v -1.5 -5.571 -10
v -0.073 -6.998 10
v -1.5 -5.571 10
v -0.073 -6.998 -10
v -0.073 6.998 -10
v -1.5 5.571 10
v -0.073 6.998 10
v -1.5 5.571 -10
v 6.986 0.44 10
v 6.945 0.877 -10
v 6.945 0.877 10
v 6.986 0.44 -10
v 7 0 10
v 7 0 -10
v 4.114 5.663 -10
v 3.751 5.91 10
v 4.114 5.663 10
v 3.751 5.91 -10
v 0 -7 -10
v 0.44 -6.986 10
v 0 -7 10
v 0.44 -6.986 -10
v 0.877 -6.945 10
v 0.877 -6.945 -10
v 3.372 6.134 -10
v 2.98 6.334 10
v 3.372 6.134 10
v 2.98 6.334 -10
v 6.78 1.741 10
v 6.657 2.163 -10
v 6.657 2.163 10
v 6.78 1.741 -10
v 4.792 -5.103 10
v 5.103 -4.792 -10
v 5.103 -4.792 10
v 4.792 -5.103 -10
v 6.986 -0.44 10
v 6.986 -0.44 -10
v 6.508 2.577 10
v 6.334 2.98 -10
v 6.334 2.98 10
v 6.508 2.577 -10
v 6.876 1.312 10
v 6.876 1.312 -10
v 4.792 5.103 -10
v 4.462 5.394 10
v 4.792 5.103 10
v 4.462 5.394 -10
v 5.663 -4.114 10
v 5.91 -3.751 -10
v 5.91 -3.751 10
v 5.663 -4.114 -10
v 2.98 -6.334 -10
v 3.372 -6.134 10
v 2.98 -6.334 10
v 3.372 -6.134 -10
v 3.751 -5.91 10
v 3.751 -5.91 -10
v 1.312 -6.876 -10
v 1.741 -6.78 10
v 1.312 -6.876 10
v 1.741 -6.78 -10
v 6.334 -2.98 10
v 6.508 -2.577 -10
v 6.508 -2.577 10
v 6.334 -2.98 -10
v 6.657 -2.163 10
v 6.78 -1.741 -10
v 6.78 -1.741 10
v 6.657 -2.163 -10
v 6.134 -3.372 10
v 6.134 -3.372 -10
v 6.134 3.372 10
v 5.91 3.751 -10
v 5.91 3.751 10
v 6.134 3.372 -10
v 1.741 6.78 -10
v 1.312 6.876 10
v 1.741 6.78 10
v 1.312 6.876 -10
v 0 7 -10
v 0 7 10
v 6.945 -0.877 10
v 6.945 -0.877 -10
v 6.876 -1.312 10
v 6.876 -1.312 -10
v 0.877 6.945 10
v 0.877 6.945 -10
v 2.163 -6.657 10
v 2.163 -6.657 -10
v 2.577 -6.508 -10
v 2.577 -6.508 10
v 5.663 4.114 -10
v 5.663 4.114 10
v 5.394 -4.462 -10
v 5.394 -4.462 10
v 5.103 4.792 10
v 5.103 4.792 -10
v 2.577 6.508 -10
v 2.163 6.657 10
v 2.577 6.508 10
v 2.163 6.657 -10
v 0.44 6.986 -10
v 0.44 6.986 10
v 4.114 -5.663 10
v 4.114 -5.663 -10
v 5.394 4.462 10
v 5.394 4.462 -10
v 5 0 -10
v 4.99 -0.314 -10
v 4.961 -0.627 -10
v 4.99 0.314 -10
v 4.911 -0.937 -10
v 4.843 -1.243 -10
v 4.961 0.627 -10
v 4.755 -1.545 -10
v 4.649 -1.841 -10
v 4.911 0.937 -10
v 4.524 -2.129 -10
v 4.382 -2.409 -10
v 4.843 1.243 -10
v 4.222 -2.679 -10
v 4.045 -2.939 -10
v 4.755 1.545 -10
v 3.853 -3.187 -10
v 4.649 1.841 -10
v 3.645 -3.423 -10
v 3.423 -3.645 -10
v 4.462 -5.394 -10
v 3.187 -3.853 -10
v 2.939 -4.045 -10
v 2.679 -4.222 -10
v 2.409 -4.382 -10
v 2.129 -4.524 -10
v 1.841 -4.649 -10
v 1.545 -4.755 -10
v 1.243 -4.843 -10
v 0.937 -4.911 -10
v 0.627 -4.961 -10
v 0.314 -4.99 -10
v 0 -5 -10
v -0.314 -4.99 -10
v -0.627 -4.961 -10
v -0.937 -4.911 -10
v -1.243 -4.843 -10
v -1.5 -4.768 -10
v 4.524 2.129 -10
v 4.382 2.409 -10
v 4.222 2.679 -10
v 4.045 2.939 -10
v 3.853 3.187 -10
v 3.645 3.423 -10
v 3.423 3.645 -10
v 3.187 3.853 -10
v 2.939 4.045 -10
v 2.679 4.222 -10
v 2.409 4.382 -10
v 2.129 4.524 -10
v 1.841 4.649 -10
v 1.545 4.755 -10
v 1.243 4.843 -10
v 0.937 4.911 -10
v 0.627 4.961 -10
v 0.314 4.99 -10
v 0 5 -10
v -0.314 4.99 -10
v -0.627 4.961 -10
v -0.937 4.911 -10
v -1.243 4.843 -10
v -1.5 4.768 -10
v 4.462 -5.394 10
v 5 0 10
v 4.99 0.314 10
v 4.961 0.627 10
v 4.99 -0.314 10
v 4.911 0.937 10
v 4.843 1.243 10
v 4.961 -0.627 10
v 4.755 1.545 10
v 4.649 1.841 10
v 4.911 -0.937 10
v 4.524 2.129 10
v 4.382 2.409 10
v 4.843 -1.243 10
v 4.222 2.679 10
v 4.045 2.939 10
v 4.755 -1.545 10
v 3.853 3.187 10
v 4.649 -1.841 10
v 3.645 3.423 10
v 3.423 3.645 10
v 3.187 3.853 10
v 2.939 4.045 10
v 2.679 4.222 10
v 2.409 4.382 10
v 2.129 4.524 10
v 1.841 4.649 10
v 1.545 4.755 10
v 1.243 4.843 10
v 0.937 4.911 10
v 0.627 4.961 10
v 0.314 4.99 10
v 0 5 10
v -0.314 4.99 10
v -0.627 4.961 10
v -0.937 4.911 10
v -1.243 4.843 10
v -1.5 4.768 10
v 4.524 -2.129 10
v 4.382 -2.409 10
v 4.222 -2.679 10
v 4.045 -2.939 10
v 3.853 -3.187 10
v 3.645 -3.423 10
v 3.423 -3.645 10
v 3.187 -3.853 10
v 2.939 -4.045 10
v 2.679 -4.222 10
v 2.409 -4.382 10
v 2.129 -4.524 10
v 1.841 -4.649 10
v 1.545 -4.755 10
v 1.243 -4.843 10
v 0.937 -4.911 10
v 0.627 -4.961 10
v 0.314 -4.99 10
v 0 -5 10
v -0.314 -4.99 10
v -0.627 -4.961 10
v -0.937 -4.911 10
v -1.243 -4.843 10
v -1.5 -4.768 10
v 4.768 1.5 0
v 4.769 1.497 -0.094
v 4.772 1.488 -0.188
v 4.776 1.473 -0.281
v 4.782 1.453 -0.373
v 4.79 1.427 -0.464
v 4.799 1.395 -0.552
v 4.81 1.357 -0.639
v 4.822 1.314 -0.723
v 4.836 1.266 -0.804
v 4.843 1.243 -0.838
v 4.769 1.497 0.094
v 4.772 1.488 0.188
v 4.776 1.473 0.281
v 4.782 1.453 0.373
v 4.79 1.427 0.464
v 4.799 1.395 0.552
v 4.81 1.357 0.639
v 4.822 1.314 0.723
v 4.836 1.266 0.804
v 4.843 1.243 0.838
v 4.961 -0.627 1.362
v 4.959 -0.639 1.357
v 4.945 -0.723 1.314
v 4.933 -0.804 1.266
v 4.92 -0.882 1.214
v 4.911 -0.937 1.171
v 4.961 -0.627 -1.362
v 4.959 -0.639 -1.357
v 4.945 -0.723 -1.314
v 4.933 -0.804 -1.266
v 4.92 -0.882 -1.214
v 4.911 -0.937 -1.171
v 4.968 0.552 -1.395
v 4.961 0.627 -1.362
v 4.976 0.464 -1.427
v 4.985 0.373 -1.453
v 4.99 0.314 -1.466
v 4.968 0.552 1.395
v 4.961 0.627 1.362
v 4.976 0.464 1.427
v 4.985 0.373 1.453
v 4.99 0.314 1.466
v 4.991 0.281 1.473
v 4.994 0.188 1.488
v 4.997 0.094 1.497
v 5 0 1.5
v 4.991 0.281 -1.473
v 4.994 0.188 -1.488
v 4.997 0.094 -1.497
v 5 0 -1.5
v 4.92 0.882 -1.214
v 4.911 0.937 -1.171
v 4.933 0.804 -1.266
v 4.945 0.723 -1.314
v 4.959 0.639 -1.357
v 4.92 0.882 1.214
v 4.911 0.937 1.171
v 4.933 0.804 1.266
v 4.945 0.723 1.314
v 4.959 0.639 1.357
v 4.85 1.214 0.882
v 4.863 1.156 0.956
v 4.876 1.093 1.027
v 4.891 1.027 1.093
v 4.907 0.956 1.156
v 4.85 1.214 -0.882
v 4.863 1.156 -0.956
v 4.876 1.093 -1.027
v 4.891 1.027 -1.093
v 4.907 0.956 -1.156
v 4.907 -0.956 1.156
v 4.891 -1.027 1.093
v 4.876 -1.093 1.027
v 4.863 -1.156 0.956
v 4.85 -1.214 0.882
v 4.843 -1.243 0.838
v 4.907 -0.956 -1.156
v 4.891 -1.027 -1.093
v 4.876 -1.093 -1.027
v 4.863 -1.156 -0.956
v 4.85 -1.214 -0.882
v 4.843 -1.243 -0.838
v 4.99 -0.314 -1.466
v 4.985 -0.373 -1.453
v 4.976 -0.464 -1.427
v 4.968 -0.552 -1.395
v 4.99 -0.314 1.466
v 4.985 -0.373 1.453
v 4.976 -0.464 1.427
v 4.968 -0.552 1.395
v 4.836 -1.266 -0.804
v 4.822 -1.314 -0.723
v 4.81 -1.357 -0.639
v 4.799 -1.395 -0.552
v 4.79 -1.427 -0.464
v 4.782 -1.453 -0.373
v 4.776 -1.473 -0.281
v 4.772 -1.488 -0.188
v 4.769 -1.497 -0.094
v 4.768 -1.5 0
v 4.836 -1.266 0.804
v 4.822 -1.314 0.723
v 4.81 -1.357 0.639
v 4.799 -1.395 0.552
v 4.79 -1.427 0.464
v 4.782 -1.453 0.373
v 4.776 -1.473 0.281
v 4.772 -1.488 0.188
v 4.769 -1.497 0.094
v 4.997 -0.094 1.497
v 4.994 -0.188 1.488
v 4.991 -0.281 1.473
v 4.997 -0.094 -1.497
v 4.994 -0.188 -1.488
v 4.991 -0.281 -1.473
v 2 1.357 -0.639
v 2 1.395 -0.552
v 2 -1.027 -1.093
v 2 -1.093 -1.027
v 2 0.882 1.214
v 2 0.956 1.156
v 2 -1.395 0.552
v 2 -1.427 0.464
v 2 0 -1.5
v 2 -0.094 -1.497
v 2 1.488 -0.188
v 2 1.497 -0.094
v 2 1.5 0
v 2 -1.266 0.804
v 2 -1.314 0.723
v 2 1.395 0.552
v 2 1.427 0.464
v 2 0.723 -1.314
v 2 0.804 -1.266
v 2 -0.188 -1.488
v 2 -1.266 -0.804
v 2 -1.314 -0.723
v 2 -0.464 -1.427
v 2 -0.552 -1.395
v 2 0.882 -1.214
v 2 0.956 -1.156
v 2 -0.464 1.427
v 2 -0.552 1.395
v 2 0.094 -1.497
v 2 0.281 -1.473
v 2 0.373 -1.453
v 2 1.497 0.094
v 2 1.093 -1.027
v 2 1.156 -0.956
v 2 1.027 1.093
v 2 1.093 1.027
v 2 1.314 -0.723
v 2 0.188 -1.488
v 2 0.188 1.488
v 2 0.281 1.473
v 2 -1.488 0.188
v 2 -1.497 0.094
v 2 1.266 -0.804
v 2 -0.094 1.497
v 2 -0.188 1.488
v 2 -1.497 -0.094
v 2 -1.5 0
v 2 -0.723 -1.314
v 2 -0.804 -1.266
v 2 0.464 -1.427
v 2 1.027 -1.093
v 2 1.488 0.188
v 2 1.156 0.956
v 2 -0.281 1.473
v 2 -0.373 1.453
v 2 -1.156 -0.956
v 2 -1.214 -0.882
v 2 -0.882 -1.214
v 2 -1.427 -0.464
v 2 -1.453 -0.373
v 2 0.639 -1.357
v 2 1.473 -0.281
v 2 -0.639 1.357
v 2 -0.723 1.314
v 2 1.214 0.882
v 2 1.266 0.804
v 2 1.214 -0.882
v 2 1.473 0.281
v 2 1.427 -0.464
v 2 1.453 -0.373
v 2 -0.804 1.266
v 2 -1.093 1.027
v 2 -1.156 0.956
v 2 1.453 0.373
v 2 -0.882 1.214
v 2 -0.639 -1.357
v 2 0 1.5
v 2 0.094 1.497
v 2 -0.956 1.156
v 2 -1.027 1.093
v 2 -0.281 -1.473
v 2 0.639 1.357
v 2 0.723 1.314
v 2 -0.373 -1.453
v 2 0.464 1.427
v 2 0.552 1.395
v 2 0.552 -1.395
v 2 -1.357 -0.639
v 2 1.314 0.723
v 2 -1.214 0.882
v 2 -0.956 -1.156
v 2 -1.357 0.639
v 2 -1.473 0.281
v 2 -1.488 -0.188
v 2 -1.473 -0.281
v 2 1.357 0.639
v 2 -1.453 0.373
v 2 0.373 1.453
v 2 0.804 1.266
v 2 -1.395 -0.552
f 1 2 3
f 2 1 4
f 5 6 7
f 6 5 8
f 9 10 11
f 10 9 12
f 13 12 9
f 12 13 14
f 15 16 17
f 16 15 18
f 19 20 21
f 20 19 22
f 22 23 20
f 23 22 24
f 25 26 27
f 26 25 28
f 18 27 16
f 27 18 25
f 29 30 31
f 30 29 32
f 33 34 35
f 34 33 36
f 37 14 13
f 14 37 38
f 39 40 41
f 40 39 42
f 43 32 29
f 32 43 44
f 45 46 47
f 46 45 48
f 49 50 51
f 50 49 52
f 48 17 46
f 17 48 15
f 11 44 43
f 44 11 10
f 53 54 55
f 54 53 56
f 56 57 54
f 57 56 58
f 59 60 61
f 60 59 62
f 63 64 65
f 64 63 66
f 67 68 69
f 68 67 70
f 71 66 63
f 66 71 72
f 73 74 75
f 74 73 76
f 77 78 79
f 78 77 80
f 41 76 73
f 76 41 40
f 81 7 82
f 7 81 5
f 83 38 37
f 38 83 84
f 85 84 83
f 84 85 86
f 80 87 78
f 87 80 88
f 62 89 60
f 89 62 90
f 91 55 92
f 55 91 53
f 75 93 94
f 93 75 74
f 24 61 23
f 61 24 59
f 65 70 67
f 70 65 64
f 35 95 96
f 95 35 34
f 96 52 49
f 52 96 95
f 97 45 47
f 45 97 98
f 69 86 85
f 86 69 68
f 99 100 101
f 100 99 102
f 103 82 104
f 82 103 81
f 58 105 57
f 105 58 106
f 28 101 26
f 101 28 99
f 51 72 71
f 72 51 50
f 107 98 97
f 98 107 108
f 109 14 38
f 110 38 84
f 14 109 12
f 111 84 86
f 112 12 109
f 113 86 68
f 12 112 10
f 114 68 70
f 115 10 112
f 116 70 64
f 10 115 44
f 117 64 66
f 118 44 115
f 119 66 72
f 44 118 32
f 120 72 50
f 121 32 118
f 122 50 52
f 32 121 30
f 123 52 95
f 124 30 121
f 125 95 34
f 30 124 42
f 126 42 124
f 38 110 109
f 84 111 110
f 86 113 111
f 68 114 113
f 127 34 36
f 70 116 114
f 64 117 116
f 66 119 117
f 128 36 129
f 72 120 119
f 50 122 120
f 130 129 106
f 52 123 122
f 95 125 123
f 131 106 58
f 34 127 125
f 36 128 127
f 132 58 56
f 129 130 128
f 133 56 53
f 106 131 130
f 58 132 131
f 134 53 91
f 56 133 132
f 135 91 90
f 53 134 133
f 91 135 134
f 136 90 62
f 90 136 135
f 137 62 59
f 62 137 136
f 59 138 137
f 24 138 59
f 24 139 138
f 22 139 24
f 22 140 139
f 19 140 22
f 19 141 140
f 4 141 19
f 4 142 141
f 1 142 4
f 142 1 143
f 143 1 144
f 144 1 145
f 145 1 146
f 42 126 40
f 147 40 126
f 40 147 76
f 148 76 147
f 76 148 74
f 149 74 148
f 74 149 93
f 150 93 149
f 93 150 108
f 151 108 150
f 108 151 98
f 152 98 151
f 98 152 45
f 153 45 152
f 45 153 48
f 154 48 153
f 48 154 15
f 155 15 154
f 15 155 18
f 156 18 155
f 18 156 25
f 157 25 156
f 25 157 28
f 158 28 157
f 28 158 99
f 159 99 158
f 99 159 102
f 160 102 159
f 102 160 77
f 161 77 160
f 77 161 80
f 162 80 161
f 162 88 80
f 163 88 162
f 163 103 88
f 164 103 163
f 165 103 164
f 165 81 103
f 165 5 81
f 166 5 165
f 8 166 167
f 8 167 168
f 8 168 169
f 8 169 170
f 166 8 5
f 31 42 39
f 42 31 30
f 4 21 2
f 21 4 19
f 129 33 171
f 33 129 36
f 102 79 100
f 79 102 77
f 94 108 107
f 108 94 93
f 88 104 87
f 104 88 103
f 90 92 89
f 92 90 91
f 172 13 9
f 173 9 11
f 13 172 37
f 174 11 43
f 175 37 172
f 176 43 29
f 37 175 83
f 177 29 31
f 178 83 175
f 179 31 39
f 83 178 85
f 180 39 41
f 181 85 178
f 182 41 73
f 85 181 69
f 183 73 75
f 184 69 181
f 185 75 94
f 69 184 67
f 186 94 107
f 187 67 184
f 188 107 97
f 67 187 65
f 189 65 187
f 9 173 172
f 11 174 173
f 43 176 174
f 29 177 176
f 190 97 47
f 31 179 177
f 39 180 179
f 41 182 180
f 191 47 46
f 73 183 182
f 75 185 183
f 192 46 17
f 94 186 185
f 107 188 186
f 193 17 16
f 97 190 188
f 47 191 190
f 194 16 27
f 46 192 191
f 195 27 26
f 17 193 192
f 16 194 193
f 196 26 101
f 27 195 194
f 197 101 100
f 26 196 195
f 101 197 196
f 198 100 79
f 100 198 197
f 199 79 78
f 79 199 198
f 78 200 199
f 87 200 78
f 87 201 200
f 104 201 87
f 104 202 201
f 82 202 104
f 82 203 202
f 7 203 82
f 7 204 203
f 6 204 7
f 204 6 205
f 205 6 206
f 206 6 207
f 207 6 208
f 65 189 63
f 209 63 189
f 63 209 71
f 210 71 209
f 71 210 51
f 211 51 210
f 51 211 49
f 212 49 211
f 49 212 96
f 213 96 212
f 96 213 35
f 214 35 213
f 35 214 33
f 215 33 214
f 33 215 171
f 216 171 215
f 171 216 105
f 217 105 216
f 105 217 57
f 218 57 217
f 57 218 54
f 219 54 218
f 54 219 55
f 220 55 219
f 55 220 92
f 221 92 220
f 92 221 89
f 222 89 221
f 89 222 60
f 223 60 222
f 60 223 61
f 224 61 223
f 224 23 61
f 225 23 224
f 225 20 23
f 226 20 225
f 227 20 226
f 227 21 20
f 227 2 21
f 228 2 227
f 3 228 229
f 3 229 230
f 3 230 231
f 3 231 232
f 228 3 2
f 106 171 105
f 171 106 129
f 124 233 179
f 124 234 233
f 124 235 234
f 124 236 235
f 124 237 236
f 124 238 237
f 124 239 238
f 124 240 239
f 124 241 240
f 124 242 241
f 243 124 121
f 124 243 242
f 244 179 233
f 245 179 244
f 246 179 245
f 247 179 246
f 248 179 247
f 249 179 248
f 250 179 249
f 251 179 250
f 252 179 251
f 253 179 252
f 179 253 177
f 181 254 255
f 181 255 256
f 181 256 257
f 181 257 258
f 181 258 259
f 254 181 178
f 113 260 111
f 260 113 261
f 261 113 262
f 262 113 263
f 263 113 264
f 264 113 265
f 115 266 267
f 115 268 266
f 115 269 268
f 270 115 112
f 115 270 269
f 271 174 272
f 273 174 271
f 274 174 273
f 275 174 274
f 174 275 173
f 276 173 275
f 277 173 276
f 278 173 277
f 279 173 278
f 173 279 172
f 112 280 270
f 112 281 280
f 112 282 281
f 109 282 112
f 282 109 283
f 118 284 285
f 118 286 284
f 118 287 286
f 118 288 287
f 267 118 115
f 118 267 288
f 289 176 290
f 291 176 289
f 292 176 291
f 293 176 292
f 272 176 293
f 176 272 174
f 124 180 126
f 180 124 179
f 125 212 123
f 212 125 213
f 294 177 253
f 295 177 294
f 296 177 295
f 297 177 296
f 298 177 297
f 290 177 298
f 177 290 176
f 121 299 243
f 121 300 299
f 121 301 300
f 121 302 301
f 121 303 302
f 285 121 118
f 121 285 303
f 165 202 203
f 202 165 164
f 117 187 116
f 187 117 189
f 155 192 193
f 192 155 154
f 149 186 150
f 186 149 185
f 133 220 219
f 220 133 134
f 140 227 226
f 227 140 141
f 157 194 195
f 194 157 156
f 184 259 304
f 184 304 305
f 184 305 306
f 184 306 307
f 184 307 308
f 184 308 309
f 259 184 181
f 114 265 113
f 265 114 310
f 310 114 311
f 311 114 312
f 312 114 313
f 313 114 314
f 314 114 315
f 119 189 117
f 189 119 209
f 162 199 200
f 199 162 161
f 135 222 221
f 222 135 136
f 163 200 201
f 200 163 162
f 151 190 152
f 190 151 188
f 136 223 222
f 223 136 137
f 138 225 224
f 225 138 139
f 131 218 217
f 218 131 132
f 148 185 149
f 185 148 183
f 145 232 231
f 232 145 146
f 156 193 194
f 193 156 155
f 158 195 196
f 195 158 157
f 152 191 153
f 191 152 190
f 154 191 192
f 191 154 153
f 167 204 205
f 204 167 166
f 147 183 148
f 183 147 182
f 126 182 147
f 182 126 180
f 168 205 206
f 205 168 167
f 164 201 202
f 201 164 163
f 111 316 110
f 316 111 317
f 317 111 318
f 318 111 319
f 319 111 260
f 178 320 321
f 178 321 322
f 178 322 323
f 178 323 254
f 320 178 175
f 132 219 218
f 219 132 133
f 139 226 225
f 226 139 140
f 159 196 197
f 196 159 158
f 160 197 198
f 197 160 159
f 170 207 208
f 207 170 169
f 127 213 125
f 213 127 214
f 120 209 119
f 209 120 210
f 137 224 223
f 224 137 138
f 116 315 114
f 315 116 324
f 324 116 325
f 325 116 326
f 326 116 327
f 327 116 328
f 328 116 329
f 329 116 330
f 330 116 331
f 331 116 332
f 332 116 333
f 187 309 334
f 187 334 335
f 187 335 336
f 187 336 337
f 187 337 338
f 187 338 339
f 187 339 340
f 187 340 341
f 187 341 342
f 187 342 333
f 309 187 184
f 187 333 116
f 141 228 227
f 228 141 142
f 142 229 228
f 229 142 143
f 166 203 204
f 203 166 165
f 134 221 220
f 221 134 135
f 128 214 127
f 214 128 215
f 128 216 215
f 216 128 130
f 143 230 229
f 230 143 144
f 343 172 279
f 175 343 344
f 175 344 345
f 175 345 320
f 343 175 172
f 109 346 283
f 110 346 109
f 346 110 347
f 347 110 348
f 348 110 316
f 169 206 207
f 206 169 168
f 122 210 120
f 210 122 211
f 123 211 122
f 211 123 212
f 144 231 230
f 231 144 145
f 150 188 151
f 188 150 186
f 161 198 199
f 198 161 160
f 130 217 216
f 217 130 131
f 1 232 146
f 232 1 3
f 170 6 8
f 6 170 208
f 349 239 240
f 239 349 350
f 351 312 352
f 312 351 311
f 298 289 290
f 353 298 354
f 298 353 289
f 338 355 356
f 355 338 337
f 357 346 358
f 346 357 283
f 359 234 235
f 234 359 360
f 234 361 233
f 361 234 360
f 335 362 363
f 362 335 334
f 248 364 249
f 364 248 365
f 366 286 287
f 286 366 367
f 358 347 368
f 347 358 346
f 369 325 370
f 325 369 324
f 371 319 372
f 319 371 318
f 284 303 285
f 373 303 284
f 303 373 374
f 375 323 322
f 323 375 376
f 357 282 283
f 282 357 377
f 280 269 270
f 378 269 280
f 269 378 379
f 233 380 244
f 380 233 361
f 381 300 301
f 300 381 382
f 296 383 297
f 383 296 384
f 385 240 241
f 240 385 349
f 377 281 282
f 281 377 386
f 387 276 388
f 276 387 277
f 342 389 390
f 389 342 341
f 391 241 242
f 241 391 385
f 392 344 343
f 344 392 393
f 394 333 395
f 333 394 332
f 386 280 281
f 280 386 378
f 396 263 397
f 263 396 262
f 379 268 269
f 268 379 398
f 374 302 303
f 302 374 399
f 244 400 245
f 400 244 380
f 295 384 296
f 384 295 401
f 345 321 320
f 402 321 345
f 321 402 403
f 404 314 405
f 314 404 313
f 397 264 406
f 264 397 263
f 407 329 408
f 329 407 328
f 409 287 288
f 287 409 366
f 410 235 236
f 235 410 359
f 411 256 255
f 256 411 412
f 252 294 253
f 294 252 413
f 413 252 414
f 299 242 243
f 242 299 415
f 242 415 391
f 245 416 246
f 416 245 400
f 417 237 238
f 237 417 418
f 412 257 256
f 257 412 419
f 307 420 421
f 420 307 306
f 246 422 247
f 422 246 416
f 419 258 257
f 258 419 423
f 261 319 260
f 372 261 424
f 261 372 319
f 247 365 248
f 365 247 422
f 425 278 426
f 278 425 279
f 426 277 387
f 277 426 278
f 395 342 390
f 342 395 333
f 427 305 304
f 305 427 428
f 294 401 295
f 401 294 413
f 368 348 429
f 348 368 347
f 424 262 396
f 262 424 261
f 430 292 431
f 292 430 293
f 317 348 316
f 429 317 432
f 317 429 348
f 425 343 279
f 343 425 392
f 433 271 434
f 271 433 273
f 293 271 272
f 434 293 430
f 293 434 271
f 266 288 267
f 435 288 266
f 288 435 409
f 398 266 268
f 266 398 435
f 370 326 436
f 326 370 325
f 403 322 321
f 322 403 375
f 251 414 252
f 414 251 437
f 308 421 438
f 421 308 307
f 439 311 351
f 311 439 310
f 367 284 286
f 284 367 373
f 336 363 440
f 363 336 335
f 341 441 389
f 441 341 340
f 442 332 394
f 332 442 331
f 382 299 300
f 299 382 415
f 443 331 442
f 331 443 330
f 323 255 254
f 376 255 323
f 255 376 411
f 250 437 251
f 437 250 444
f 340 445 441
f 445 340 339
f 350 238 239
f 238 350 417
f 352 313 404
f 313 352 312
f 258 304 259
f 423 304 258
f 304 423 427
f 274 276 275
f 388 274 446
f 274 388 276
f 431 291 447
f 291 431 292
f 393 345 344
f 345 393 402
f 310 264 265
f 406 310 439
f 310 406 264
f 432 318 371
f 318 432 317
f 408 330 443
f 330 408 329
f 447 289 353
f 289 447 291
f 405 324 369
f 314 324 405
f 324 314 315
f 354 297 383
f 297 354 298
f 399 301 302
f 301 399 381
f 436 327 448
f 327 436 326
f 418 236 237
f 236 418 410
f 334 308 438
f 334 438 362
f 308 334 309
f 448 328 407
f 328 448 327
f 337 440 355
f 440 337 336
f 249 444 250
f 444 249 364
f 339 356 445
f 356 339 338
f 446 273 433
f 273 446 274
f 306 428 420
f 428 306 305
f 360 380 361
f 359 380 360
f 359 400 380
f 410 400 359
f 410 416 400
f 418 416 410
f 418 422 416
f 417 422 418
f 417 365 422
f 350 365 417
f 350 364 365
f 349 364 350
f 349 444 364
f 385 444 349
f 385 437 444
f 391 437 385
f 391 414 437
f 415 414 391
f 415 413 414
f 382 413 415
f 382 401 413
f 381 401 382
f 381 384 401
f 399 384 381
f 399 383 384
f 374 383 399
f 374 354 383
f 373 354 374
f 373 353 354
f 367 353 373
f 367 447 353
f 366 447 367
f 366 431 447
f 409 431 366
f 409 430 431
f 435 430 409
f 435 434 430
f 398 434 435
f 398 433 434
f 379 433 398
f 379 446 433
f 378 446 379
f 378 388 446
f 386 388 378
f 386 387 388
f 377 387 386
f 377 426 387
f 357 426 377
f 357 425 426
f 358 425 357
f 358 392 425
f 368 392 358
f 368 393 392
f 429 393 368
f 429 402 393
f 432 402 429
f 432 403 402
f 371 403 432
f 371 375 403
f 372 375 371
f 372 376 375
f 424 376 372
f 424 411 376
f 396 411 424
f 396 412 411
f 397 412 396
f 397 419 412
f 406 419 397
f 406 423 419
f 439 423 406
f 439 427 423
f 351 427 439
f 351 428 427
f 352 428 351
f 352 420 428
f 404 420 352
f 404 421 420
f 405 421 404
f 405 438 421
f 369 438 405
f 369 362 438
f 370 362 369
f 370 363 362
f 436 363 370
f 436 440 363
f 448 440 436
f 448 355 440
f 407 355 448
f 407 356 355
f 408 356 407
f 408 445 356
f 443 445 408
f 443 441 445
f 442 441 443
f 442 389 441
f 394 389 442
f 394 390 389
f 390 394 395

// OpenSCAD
$fn=100;

diameterPipe = 10;
thickness = 2;
height = 20;
partitionDepth = 0.65*diameterPipe+thickness;

diameterBit = 3;
heightBit = 3;

module projektorClip() {
    difference() {
        cylinder(r=(diameterPipe/2)+thickness, h=height, center = true);
        cylinder(r=diameterPipe/2, h=height, center=true);
        translate([-(diameterPipe/2+thickness), 
                -(diameterPipe+2*thickness)/2,
                -height/2]) {
            cube([diameterPipe+2*thickness-partitionDepth,
                    diameterPipe+2*thickness,
                    height],
                 center=false);
        };
for(angle=[-135, 135]){
rotate(v=[0,0,1], a=angle) {
        translate([diameterPipe/2, 
                -(diameterPipe+2*thickness)/2,
                -(height+1)/2]) {
            cube([diameterPipe+2*thickness-partitionDepth,
                    diameterPipe+2*thickness,
                    (height+1)],
                 center=false);
        };
    };
    };
};
    rotate(v=[0,1,0], a=90) {
        translate([0,0,diameterPipe/2-heightBit]) {
            cylinder(r=diameterBit/2, h=heightBit);
        };        
    };
};

projektorClip();
